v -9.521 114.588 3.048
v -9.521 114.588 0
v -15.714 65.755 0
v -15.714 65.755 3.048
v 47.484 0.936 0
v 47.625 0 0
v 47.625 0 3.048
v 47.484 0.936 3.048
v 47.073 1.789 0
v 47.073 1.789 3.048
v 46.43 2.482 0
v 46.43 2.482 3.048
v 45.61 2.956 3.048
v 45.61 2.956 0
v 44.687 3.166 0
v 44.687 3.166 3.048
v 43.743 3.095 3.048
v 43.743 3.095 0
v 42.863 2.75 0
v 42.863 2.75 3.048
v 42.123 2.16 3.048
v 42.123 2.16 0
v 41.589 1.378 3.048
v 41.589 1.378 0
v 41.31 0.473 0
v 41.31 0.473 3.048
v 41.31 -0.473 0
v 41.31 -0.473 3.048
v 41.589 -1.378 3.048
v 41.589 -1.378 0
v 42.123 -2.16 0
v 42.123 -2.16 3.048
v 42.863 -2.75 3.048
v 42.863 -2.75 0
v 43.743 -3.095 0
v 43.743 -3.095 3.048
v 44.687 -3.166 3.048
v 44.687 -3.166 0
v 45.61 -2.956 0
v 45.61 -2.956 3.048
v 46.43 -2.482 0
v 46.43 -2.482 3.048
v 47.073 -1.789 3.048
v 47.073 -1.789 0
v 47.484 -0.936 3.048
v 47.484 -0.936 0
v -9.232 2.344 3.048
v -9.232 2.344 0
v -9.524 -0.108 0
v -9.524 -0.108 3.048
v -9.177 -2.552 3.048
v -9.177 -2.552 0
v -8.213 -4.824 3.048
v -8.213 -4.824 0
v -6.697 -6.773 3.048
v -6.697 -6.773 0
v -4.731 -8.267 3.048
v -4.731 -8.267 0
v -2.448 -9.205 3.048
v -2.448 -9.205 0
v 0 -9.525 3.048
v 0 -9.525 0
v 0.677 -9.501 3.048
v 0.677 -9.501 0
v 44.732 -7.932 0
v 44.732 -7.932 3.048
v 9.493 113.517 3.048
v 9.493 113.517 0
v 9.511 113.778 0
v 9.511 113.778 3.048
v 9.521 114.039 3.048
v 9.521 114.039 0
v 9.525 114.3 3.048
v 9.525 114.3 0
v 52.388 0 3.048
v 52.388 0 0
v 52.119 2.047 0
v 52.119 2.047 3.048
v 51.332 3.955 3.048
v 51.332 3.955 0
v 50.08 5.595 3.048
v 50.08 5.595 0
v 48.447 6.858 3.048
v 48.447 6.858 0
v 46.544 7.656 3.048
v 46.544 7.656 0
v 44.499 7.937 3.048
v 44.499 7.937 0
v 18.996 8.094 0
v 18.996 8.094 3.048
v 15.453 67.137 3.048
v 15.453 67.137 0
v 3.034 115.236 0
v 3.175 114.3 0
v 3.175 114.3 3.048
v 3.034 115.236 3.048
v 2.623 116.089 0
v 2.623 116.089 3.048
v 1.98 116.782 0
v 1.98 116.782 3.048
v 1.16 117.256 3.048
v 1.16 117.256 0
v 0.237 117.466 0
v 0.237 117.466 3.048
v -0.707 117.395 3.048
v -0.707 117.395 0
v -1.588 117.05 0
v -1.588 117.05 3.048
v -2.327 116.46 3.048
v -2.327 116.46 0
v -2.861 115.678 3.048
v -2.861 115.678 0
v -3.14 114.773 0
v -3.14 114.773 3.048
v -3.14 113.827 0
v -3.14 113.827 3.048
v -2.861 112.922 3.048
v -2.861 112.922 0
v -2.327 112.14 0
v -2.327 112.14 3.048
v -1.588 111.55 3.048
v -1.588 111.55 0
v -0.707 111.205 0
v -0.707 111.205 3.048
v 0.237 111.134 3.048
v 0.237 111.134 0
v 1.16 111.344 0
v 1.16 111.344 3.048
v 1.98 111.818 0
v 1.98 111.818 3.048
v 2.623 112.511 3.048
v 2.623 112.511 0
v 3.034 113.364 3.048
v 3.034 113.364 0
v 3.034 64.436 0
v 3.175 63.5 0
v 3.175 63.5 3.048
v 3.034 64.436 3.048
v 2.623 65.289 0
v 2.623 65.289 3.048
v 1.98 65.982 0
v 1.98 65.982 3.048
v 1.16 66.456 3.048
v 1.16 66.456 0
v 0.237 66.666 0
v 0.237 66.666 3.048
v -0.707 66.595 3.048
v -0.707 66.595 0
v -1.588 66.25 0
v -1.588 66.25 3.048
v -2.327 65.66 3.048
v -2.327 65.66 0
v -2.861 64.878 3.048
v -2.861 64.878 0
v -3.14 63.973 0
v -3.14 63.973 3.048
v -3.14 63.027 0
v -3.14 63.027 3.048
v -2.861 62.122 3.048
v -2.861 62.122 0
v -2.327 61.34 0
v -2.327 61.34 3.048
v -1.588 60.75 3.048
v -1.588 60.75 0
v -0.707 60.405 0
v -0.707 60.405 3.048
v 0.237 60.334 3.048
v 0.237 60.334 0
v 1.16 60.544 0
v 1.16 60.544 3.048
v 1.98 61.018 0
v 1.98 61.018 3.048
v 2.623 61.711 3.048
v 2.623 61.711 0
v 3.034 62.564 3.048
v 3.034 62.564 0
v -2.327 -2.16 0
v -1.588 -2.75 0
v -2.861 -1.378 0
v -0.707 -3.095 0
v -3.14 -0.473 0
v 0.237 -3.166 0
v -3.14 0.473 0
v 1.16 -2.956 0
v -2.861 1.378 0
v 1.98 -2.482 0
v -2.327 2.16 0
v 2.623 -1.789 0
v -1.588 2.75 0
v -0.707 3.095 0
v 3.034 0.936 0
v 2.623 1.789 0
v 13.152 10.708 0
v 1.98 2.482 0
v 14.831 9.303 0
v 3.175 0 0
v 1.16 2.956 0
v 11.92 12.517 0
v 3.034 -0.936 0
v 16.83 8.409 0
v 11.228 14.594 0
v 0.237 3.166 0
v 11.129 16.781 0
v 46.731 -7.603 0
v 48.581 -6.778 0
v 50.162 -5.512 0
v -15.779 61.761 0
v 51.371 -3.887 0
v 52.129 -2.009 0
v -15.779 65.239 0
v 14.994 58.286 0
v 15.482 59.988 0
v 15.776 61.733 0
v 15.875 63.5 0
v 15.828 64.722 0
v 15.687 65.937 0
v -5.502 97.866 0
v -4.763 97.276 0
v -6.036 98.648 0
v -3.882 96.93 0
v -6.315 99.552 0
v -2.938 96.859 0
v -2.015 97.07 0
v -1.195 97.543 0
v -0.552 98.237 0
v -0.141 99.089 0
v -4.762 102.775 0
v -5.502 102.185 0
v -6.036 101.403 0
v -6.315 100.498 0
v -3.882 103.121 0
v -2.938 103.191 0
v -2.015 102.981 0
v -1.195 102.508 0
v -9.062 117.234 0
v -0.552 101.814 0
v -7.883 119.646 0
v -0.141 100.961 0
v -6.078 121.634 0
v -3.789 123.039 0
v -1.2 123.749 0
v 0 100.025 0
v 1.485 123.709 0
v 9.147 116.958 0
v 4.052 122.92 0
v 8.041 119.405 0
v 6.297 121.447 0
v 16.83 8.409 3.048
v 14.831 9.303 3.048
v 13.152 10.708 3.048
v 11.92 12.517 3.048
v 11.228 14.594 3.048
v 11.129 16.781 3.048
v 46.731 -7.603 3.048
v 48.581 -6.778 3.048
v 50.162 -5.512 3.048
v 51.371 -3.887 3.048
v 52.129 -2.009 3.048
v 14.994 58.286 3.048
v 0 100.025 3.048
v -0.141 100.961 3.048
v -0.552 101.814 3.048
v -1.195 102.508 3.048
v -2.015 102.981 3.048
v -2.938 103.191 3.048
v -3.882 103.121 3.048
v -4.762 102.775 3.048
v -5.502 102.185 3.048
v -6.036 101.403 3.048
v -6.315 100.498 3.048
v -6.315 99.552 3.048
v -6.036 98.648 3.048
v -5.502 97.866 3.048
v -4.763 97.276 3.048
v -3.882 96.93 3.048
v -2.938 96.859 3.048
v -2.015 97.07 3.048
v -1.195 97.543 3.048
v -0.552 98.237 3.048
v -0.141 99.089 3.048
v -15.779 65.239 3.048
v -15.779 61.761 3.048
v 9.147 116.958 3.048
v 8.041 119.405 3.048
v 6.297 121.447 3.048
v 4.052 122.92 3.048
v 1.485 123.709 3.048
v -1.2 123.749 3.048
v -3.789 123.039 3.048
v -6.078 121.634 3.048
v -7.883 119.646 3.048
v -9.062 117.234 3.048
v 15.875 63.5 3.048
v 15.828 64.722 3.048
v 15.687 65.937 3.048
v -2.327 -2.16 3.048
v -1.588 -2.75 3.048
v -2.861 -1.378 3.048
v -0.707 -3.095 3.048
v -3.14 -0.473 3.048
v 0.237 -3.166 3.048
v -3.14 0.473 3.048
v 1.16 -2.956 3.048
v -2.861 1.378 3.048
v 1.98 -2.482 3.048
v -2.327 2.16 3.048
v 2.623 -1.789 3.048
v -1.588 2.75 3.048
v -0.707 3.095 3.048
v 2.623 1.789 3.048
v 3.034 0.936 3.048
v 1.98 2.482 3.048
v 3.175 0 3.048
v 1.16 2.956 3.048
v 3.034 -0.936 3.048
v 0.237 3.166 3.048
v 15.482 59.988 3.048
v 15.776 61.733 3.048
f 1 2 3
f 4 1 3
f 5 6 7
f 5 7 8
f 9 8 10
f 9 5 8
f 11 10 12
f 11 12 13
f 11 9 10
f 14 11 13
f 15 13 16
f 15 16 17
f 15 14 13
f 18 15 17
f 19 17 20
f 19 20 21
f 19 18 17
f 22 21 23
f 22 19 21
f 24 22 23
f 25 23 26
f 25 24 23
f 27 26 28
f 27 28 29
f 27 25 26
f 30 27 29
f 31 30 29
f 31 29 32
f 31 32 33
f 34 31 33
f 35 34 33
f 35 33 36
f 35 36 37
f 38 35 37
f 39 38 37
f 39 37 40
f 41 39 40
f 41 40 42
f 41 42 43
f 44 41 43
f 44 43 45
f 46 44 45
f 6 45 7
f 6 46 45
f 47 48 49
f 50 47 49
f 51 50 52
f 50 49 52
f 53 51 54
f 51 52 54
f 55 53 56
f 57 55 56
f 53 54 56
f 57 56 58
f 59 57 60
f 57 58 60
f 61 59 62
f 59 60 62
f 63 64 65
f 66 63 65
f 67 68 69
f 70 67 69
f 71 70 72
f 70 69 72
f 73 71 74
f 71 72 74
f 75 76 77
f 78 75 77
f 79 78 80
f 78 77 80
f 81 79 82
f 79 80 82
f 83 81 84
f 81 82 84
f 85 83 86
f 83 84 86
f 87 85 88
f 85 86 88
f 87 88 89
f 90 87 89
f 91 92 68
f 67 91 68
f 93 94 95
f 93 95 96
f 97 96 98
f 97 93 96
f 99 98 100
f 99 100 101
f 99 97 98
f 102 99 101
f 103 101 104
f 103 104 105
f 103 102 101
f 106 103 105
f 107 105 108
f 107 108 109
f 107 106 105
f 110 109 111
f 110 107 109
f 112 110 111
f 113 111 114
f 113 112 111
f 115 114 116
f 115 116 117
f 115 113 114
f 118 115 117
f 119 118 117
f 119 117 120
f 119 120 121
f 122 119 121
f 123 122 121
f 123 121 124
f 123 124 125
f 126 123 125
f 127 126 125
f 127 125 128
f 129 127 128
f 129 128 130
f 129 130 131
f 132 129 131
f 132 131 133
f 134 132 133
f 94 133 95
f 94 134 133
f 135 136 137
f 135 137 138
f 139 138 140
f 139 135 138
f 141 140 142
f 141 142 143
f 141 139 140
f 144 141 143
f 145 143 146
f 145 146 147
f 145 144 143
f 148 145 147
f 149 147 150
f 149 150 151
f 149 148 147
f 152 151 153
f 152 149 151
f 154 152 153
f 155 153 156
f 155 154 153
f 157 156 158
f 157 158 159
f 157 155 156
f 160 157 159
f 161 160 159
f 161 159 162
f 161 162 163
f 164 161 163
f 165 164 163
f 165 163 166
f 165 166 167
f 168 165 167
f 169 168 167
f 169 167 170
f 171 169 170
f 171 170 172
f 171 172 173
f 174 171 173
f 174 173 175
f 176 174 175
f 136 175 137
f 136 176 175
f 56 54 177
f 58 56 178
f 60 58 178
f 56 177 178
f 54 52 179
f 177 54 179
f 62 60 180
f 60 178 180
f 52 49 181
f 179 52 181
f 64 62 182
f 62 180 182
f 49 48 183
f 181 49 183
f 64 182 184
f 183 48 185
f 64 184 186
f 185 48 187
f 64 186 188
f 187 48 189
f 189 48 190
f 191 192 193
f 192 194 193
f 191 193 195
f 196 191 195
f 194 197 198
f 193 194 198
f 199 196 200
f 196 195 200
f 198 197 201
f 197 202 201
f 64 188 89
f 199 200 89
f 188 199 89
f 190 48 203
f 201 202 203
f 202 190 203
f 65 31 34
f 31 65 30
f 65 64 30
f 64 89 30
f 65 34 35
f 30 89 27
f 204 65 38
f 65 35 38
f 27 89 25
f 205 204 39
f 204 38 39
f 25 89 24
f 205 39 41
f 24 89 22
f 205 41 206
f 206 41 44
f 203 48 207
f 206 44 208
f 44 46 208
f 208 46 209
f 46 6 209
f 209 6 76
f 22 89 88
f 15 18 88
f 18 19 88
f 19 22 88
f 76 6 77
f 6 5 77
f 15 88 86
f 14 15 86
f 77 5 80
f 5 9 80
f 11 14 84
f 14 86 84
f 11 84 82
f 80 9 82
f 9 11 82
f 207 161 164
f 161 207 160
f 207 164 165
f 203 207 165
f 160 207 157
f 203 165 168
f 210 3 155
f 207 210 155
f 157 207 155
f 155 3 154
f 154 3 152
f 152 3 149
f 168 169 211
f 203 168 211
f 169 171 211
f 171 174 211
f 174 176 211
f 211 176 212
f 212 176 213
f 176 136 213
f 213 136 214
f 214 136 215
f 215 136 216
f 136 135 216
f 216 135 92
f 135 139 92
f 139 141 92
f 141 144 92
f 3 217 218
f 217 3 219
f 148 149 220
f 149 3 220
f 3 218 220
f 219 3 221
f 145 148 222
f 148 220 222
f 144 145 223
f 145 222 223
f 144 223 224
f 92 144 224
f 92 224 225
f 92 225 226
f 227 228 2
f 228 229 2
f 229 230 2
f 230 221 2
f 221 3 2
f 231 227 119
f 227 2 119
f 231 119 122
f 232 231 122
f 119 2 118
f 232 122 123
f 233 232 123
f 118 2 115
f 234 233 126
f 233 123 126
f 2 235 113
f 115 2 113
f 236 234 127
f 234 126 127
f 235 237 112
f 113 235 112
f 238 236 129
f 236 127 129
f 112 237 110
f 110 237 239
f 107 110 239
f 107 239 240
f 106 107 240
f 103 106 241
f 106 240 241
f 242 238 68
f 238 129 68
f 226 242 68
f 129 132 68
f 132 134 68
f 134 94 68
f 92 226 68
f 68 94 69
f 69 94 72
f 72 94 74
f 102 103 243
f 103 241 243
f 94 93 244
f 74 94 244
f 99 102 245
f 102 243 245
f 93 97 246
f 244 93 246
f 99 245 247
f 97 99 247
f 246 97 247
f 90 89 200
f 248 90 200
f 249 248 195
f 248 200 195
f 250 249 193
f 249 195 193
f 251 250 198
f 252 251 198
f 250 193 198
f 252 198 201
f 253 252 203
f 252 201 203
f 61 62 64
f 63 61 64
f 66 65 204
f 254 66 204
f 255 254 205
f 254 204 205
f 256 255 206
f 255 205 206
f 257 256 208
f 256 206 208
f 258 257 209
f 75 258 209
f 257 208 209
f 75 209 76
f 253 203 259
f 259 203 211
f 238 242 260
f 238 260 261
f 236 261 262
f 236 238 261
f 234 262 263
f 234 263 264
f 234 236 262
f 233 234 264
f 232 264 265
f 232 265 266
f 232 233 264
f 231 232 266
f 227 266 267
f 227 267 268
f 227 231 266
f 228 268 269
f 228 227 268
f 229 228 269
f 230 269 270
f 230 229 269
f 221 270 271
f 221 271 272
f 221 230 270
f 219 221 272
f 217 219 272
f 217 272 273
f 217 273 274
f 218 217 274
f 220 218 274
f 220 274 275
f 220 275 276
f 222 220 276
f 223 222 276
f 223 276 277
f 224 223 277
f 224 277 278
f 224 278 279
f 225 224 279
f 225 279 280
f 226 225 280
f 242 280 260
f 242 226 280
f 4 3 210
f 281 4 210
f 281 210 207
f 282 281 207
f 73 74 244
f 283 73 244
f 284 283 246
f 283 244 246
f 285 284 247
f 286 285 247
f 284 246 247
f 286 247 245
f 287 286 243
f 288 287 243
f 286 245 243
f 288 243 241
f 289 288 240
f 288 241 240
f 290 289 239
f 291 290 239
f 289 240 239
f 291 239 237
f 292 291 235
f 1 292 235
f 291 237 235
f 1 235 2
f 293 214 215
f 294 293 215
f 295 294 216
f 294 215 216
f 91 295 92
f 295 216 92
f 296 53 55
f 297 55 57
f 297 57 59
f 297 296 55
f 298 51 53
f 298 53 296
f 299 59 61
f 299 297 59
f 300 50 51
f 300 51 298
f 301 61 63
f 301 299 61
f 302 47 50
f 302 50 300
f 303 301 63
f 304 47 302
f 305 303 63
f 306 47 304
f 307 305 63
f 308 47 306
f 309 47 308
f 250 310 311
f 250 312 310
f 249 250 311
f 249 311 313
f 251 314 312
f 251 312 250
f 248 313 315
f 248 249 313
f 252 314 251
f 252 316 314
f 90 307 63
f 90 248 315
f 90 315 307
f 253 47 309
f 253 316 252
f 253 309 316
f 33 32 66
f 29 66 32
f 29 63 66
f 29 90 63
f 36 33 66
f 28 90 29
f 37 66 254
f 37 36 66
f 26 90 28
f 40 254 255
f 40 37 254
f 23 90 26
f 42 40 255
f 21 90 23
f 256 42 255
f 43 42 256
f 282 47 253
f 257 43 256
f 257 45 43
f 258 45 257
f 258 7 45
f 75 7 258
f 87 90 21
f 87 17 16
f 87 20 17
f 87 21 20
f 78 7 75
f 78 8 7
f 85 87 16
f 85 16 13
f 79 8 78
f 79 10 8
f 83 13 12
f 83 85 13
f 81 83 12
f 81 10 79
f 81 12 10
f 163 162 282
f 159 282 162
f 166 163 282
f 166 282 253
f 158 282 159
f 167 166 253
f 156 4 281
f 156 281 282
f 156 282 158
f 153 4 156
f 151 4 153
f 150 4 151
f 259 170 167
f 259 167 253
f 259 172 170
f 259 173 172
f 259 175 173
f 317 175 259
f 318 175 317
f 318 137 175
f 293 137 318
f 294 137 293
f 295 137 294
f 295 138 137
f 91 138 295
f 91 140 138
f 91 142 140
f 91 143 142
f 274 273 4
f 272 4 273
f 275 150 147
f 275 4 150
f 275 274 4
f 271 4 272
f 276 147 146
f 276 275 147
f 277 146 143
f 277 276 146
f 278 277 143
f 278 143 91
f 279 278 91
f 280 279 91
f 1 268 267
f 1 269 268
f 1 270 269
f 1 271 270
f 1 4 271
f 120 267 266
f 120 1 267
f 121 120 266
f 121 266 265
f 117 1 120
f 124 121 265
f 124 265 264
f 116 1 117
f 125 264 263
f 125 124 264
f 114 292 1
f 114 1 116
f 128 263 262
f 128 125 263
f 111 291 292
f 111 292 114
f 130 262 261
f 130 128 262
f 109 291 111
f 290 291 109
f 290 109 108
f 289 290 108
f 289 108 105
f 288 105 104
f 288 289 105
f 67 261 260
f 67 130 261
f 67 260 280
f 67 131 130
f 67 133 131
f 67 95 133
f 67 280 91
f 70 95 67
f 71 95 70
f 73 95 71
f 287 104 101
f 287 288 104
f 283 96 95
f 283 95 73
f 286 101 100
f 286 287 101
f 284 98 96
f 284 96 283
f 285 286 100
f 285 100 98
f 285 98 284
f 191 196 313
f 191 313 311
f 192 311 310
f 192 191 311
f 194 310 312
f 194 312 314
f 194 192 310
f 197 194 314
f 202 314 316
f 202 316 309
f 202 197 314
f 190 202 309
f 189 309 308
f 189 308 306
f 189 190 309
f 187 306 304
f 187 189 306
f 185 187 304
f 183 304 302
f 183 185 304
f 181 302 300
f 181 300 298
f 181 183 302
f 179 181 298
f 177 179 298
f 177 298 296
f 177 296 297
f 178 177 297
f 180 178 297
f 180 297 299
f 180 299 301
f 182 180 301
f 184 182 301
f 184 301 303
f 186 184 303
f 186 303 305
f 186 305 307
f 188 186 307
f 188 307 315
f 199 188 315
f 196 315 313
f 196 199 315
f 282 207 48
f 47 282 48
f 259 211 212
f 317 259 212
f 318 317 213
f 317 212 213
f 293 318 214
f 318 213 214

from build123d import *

# Parameters (mm, degrees)
F0_R     = 3.175
F1_DEPTH = 3.048


with BuildPart() as f1:
    # F0 (on Top) → F1 (new body)
    with BuildSketch(Plane.XY):
        with BuildLine():
            ThreePointArc((9.525, 114.3), (0.14395, 123.823912), (-9.520649, 114.587868))
            ThreePointArc((-9.520649, 114.587868), (-0.535581, 104.79007), (9.492768, 113.517068))
            ThreePointArc((9.492768, 113.517068), (9.516939, 113.908203), (9.525, 114.3))
        make_face()
        with Locations((0, 114.3)):
            Circle(F0_R, mode=Mode.SUBTRACT)
        with BuildLine():
            Line((-9.520649, 114.587868), (-15.713958, 65.755468))
            ThreePointArc((-15.713958, 65.755468), (-0.703254, 79.359415), (15.452647, 67.137488))
            Line((15.452647, 67.137488), (9.492768, 113.517068))
            ThreePointArc((9.492768, 113.517068), (-0.535581, 104.79007), (-9.520649, 114.587868))
        make_face()
        with Locations((-3.175, 100.0252)):
            Circle(F0_R, mode=Mode.SUBTRACT)
        with BuildLine():
            Line((-15.779489, 65.238779), (-15.779489, 61.761221))
            ThreePointArc((-15.779489, 61.761221), (-1.781346, 47.72526), (14.994367, 58.286115))
            ThreePointArc((14.994367, 58.286115), (15.653293, 60.856134), (15.875, 63.5))
            ThreePointArc((15.875, 63.5), (15.769058, 65.330963), (15.452647, 67.137488))
            ThreePointArc((15.452647, 67.137488), (-0.703254, 79.359415), (-15.713958, 65.755468))
            Line((-15.713958, 65.755468), (-15.779489, 65.238779))
        make_face()
        with Locations((0, 63.5)):
            Circle(F0_R, mode=Mode.SUBTRACT)
        with BuildLine():
            ThreePointArc((-9.23214, 2.343762), (1.180994, 9.451501), (9.525, 0))
            ThreePointArc((9.525, 0), (6.970557, -6.491299), (0.677344, -9.500886))
            Line((0.677344, -9.500886), (44.732405, -7.932475))
            ThreePointArc((44.732405, -7.932475), (36.51336, -0.116834), (44.498789, 7.93735))
            Line((44.498789, 7.93735), (18.996134, 8.094108))
            ThreePointArc((18.996134, 8.094108), (13.152067, 10.707585), (11.129055, 16.781365))
            Line((11.129055, 16.781365), (14.994367, 58.286115))
            ThreePointArc((14.994367, 58.286115), (-1.781346, 47.72526), (-15.779489, 61.761221))
            Line((-15.779489, 61.761221), (-9.23214, 2.343762))
        make_face()
        with BuildLine():
            ThreePointArc((0.677344, -9.500886), (6.970557, -6.491299), (9.525, 0))
            ThreePointArc((9.525, 0), (1.180994, 9.451501), (-9.23214, 2.343762))
            ThreePointArc((-9.23214, 2.343762), (-7.51831, -5.848132), (0, -9.525))
            Line((0, -9.525), (0.677344, -9.500886))
        make_face()
        Circle(F0_R, mode=Mode.SUBTRACT)
        with BuildLine():
            ThreePointArc((44.498789, 7.93735), (36.51336, -0.116834), (44.732405, -7.932475))
            ThreePointArc((44.732405, -7.932475), (50.161633, -5.51191), (52.3875, 0))
            ThreePointArc((52.3875, 0), (50.079883, 5.595384), (44.498789, 7.93735))
        make_face()
        with Locations((44.45, 0)):
            Circle(F0_R, mode=Mode.SUBTRACT)
    extrude(amount=F1_DEPTH)


solid = f1.part
